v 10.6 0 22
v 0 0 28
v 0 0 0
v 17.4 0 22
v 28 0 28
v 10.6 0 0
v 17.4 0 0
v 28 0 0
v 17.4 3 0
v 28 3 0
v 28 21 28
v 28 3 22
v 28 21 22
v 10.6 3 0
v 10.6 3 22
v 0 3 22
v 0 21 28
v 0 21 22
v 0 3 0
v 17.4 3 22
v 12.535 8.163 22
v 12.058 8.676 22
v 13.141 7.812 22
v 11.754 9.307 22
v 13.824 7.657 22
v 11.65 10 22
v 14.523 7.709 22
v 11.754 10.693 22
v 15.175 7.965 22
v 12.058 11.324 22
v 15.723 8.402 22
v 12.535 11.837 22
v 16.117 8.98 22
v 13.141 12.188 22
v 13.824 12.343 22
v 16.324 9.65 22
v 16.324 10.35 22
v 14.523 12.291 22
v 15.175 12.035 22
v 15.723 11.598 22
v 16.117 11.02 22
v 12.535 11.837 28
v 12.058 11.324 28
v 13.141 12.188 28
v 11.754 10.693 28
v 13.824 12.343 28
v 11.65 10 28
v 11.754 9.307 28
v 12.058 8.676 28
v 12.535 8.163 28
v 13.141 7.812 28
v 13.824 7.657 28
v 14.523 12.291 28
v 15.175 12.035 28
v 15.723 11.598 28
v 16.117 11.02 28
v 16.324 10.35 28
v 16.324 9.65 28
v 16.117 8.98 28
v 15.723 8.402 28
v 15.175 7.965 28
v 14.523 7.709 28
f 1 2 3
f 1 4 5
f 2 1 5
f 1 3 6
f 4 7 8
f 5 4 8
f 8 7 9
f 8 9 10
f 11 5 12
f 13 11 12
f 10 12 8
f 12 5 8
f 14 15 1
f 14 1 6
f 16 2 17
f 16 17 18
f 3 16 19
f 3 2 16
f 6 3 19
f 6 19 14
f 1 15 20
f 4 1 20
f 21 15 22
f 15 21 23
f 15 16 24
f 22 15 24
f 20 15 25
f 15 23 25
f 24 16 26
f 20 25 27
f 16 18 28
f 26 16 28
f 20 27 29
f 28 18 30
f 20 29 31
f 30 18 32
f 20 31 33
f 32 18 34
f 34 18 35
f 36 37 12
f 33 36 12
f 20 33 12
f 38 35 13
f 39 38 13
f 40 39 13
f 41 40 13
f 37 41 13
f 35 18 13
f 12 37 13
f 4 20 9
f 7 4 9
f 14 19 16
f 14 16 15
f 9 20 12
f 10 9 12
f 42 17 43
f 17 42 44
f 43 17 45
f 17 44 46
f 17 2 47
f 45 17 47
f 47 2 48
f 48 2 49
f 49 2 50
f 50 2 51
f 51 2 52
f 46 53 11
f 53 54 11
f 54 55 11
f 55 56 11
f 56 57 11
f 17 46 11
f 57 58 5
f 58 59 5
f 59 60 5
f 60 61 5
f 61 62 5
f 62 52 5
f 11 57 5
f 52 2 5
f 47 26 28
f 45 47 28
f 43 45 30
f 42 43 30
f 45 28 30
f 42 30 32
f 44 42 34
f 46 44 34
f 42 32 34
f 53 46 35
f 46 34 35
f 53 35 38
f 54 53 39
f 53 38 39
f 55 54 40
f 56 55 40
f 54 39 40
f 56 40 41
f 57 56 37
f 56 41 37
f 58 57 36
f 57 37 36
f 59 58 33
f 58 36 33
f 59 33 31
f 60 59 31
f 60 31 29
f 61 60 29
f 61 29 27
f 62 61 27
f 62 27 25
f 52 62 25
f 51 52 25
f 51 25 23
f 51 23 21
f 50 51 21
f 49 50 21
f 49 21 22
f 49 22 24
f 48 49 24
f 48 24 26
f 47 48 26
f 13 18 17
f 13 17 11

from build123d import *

# Parameters (mm, degrees)
SKETCH1_W           = 28
SKETCH1_H           = 28
BOSS_EXTRUDE1_DEPTH = 25
SKETCH2_W           = 28
SKETCH2_H           = 22
CUT_EXTRUDE1_DEPTH  = 22
SKETCH3_W           = 6.8
SKETCH3_H           = 22
CUT_EXTRUDE2_DEPTH  = 46.299006612
SKETCH4_R           = 2.35
CUT_EXTRUDE3_DEPTH  = 44.508619836
SKETCH5_W           = 28
SKETCH5_H           = 6
CUT_EXTRUDE4_DEPTH  = 4


with BuildPart() as part:
    # Sketch1 → Boss-Extrude1 (new body)
    with BuildSketch(Plane(origin=(0, 0, 0), x_dir=(1, 0, 0), z_dir=(0, 1, 0))):
        with Locations((14, -14)):
            Rectangle(SKETCH1_W, SKETCH1_H)
    extrude(amount=BOSS_EXTRUDE1_DEPTH)

    # Sketch2 → Cut-Extrude1 (cut)
    with BuildSketch(Plane(origin=(0, 25, 0), x_dir=(1, 0, 0), z_dir=(0, 1, 0))):
        with Locations((14, -11)):
            Rectangle(SKETCH2_W, SKETCH2_H)
    extrude(amount=-CUT_EXTRUDE1_DEPTH, mode=Mode.SUBTRACT)

    # Sketch3 → Cut-Extrude2 (cut, through all)
    with BuildSketch(Plane(origin=(0, 3, 0), x_dir=(1, 0, 0), z_dir=(0, 1, 0))):
        with Locations((14, -11)):
            Rectangle(SKETCH3_W, SKETCH3_H)
    extrude(amount=-CUT_EXTRUDE2_DEPTH, mode=Mode.SUBTRACT)

    # Sketch4 → Cut-Extrude3 (cut, through all)
    with BuildSketch(Plane(origin=(0, 0, 22), x_dir=(-1, 0, 0), z_dir=(0, 0, -1))):
        with Locations((-14, 10)):
            Circle(SKETCH4_R)
    extrude(amount=-CUT_EXTRUDE3_DEPTH, mode=Mode.SUBTRACT)

    # Sketch5 → Cut-Extrude4 (cut)
    with BuildSketch(Plane(origin=(0, 25, 0), x_dir=(1, 0, 0), z_dir=(0, 1, 0))):
        with Locations((14, -25)):
            Rectangle(SKETCH5_W, SKETCH5_H)
    extrude(amount=-CUT_EXTRUDE4_DEPTH, mode=Mode.SUBTRACT)


solid = part.part
